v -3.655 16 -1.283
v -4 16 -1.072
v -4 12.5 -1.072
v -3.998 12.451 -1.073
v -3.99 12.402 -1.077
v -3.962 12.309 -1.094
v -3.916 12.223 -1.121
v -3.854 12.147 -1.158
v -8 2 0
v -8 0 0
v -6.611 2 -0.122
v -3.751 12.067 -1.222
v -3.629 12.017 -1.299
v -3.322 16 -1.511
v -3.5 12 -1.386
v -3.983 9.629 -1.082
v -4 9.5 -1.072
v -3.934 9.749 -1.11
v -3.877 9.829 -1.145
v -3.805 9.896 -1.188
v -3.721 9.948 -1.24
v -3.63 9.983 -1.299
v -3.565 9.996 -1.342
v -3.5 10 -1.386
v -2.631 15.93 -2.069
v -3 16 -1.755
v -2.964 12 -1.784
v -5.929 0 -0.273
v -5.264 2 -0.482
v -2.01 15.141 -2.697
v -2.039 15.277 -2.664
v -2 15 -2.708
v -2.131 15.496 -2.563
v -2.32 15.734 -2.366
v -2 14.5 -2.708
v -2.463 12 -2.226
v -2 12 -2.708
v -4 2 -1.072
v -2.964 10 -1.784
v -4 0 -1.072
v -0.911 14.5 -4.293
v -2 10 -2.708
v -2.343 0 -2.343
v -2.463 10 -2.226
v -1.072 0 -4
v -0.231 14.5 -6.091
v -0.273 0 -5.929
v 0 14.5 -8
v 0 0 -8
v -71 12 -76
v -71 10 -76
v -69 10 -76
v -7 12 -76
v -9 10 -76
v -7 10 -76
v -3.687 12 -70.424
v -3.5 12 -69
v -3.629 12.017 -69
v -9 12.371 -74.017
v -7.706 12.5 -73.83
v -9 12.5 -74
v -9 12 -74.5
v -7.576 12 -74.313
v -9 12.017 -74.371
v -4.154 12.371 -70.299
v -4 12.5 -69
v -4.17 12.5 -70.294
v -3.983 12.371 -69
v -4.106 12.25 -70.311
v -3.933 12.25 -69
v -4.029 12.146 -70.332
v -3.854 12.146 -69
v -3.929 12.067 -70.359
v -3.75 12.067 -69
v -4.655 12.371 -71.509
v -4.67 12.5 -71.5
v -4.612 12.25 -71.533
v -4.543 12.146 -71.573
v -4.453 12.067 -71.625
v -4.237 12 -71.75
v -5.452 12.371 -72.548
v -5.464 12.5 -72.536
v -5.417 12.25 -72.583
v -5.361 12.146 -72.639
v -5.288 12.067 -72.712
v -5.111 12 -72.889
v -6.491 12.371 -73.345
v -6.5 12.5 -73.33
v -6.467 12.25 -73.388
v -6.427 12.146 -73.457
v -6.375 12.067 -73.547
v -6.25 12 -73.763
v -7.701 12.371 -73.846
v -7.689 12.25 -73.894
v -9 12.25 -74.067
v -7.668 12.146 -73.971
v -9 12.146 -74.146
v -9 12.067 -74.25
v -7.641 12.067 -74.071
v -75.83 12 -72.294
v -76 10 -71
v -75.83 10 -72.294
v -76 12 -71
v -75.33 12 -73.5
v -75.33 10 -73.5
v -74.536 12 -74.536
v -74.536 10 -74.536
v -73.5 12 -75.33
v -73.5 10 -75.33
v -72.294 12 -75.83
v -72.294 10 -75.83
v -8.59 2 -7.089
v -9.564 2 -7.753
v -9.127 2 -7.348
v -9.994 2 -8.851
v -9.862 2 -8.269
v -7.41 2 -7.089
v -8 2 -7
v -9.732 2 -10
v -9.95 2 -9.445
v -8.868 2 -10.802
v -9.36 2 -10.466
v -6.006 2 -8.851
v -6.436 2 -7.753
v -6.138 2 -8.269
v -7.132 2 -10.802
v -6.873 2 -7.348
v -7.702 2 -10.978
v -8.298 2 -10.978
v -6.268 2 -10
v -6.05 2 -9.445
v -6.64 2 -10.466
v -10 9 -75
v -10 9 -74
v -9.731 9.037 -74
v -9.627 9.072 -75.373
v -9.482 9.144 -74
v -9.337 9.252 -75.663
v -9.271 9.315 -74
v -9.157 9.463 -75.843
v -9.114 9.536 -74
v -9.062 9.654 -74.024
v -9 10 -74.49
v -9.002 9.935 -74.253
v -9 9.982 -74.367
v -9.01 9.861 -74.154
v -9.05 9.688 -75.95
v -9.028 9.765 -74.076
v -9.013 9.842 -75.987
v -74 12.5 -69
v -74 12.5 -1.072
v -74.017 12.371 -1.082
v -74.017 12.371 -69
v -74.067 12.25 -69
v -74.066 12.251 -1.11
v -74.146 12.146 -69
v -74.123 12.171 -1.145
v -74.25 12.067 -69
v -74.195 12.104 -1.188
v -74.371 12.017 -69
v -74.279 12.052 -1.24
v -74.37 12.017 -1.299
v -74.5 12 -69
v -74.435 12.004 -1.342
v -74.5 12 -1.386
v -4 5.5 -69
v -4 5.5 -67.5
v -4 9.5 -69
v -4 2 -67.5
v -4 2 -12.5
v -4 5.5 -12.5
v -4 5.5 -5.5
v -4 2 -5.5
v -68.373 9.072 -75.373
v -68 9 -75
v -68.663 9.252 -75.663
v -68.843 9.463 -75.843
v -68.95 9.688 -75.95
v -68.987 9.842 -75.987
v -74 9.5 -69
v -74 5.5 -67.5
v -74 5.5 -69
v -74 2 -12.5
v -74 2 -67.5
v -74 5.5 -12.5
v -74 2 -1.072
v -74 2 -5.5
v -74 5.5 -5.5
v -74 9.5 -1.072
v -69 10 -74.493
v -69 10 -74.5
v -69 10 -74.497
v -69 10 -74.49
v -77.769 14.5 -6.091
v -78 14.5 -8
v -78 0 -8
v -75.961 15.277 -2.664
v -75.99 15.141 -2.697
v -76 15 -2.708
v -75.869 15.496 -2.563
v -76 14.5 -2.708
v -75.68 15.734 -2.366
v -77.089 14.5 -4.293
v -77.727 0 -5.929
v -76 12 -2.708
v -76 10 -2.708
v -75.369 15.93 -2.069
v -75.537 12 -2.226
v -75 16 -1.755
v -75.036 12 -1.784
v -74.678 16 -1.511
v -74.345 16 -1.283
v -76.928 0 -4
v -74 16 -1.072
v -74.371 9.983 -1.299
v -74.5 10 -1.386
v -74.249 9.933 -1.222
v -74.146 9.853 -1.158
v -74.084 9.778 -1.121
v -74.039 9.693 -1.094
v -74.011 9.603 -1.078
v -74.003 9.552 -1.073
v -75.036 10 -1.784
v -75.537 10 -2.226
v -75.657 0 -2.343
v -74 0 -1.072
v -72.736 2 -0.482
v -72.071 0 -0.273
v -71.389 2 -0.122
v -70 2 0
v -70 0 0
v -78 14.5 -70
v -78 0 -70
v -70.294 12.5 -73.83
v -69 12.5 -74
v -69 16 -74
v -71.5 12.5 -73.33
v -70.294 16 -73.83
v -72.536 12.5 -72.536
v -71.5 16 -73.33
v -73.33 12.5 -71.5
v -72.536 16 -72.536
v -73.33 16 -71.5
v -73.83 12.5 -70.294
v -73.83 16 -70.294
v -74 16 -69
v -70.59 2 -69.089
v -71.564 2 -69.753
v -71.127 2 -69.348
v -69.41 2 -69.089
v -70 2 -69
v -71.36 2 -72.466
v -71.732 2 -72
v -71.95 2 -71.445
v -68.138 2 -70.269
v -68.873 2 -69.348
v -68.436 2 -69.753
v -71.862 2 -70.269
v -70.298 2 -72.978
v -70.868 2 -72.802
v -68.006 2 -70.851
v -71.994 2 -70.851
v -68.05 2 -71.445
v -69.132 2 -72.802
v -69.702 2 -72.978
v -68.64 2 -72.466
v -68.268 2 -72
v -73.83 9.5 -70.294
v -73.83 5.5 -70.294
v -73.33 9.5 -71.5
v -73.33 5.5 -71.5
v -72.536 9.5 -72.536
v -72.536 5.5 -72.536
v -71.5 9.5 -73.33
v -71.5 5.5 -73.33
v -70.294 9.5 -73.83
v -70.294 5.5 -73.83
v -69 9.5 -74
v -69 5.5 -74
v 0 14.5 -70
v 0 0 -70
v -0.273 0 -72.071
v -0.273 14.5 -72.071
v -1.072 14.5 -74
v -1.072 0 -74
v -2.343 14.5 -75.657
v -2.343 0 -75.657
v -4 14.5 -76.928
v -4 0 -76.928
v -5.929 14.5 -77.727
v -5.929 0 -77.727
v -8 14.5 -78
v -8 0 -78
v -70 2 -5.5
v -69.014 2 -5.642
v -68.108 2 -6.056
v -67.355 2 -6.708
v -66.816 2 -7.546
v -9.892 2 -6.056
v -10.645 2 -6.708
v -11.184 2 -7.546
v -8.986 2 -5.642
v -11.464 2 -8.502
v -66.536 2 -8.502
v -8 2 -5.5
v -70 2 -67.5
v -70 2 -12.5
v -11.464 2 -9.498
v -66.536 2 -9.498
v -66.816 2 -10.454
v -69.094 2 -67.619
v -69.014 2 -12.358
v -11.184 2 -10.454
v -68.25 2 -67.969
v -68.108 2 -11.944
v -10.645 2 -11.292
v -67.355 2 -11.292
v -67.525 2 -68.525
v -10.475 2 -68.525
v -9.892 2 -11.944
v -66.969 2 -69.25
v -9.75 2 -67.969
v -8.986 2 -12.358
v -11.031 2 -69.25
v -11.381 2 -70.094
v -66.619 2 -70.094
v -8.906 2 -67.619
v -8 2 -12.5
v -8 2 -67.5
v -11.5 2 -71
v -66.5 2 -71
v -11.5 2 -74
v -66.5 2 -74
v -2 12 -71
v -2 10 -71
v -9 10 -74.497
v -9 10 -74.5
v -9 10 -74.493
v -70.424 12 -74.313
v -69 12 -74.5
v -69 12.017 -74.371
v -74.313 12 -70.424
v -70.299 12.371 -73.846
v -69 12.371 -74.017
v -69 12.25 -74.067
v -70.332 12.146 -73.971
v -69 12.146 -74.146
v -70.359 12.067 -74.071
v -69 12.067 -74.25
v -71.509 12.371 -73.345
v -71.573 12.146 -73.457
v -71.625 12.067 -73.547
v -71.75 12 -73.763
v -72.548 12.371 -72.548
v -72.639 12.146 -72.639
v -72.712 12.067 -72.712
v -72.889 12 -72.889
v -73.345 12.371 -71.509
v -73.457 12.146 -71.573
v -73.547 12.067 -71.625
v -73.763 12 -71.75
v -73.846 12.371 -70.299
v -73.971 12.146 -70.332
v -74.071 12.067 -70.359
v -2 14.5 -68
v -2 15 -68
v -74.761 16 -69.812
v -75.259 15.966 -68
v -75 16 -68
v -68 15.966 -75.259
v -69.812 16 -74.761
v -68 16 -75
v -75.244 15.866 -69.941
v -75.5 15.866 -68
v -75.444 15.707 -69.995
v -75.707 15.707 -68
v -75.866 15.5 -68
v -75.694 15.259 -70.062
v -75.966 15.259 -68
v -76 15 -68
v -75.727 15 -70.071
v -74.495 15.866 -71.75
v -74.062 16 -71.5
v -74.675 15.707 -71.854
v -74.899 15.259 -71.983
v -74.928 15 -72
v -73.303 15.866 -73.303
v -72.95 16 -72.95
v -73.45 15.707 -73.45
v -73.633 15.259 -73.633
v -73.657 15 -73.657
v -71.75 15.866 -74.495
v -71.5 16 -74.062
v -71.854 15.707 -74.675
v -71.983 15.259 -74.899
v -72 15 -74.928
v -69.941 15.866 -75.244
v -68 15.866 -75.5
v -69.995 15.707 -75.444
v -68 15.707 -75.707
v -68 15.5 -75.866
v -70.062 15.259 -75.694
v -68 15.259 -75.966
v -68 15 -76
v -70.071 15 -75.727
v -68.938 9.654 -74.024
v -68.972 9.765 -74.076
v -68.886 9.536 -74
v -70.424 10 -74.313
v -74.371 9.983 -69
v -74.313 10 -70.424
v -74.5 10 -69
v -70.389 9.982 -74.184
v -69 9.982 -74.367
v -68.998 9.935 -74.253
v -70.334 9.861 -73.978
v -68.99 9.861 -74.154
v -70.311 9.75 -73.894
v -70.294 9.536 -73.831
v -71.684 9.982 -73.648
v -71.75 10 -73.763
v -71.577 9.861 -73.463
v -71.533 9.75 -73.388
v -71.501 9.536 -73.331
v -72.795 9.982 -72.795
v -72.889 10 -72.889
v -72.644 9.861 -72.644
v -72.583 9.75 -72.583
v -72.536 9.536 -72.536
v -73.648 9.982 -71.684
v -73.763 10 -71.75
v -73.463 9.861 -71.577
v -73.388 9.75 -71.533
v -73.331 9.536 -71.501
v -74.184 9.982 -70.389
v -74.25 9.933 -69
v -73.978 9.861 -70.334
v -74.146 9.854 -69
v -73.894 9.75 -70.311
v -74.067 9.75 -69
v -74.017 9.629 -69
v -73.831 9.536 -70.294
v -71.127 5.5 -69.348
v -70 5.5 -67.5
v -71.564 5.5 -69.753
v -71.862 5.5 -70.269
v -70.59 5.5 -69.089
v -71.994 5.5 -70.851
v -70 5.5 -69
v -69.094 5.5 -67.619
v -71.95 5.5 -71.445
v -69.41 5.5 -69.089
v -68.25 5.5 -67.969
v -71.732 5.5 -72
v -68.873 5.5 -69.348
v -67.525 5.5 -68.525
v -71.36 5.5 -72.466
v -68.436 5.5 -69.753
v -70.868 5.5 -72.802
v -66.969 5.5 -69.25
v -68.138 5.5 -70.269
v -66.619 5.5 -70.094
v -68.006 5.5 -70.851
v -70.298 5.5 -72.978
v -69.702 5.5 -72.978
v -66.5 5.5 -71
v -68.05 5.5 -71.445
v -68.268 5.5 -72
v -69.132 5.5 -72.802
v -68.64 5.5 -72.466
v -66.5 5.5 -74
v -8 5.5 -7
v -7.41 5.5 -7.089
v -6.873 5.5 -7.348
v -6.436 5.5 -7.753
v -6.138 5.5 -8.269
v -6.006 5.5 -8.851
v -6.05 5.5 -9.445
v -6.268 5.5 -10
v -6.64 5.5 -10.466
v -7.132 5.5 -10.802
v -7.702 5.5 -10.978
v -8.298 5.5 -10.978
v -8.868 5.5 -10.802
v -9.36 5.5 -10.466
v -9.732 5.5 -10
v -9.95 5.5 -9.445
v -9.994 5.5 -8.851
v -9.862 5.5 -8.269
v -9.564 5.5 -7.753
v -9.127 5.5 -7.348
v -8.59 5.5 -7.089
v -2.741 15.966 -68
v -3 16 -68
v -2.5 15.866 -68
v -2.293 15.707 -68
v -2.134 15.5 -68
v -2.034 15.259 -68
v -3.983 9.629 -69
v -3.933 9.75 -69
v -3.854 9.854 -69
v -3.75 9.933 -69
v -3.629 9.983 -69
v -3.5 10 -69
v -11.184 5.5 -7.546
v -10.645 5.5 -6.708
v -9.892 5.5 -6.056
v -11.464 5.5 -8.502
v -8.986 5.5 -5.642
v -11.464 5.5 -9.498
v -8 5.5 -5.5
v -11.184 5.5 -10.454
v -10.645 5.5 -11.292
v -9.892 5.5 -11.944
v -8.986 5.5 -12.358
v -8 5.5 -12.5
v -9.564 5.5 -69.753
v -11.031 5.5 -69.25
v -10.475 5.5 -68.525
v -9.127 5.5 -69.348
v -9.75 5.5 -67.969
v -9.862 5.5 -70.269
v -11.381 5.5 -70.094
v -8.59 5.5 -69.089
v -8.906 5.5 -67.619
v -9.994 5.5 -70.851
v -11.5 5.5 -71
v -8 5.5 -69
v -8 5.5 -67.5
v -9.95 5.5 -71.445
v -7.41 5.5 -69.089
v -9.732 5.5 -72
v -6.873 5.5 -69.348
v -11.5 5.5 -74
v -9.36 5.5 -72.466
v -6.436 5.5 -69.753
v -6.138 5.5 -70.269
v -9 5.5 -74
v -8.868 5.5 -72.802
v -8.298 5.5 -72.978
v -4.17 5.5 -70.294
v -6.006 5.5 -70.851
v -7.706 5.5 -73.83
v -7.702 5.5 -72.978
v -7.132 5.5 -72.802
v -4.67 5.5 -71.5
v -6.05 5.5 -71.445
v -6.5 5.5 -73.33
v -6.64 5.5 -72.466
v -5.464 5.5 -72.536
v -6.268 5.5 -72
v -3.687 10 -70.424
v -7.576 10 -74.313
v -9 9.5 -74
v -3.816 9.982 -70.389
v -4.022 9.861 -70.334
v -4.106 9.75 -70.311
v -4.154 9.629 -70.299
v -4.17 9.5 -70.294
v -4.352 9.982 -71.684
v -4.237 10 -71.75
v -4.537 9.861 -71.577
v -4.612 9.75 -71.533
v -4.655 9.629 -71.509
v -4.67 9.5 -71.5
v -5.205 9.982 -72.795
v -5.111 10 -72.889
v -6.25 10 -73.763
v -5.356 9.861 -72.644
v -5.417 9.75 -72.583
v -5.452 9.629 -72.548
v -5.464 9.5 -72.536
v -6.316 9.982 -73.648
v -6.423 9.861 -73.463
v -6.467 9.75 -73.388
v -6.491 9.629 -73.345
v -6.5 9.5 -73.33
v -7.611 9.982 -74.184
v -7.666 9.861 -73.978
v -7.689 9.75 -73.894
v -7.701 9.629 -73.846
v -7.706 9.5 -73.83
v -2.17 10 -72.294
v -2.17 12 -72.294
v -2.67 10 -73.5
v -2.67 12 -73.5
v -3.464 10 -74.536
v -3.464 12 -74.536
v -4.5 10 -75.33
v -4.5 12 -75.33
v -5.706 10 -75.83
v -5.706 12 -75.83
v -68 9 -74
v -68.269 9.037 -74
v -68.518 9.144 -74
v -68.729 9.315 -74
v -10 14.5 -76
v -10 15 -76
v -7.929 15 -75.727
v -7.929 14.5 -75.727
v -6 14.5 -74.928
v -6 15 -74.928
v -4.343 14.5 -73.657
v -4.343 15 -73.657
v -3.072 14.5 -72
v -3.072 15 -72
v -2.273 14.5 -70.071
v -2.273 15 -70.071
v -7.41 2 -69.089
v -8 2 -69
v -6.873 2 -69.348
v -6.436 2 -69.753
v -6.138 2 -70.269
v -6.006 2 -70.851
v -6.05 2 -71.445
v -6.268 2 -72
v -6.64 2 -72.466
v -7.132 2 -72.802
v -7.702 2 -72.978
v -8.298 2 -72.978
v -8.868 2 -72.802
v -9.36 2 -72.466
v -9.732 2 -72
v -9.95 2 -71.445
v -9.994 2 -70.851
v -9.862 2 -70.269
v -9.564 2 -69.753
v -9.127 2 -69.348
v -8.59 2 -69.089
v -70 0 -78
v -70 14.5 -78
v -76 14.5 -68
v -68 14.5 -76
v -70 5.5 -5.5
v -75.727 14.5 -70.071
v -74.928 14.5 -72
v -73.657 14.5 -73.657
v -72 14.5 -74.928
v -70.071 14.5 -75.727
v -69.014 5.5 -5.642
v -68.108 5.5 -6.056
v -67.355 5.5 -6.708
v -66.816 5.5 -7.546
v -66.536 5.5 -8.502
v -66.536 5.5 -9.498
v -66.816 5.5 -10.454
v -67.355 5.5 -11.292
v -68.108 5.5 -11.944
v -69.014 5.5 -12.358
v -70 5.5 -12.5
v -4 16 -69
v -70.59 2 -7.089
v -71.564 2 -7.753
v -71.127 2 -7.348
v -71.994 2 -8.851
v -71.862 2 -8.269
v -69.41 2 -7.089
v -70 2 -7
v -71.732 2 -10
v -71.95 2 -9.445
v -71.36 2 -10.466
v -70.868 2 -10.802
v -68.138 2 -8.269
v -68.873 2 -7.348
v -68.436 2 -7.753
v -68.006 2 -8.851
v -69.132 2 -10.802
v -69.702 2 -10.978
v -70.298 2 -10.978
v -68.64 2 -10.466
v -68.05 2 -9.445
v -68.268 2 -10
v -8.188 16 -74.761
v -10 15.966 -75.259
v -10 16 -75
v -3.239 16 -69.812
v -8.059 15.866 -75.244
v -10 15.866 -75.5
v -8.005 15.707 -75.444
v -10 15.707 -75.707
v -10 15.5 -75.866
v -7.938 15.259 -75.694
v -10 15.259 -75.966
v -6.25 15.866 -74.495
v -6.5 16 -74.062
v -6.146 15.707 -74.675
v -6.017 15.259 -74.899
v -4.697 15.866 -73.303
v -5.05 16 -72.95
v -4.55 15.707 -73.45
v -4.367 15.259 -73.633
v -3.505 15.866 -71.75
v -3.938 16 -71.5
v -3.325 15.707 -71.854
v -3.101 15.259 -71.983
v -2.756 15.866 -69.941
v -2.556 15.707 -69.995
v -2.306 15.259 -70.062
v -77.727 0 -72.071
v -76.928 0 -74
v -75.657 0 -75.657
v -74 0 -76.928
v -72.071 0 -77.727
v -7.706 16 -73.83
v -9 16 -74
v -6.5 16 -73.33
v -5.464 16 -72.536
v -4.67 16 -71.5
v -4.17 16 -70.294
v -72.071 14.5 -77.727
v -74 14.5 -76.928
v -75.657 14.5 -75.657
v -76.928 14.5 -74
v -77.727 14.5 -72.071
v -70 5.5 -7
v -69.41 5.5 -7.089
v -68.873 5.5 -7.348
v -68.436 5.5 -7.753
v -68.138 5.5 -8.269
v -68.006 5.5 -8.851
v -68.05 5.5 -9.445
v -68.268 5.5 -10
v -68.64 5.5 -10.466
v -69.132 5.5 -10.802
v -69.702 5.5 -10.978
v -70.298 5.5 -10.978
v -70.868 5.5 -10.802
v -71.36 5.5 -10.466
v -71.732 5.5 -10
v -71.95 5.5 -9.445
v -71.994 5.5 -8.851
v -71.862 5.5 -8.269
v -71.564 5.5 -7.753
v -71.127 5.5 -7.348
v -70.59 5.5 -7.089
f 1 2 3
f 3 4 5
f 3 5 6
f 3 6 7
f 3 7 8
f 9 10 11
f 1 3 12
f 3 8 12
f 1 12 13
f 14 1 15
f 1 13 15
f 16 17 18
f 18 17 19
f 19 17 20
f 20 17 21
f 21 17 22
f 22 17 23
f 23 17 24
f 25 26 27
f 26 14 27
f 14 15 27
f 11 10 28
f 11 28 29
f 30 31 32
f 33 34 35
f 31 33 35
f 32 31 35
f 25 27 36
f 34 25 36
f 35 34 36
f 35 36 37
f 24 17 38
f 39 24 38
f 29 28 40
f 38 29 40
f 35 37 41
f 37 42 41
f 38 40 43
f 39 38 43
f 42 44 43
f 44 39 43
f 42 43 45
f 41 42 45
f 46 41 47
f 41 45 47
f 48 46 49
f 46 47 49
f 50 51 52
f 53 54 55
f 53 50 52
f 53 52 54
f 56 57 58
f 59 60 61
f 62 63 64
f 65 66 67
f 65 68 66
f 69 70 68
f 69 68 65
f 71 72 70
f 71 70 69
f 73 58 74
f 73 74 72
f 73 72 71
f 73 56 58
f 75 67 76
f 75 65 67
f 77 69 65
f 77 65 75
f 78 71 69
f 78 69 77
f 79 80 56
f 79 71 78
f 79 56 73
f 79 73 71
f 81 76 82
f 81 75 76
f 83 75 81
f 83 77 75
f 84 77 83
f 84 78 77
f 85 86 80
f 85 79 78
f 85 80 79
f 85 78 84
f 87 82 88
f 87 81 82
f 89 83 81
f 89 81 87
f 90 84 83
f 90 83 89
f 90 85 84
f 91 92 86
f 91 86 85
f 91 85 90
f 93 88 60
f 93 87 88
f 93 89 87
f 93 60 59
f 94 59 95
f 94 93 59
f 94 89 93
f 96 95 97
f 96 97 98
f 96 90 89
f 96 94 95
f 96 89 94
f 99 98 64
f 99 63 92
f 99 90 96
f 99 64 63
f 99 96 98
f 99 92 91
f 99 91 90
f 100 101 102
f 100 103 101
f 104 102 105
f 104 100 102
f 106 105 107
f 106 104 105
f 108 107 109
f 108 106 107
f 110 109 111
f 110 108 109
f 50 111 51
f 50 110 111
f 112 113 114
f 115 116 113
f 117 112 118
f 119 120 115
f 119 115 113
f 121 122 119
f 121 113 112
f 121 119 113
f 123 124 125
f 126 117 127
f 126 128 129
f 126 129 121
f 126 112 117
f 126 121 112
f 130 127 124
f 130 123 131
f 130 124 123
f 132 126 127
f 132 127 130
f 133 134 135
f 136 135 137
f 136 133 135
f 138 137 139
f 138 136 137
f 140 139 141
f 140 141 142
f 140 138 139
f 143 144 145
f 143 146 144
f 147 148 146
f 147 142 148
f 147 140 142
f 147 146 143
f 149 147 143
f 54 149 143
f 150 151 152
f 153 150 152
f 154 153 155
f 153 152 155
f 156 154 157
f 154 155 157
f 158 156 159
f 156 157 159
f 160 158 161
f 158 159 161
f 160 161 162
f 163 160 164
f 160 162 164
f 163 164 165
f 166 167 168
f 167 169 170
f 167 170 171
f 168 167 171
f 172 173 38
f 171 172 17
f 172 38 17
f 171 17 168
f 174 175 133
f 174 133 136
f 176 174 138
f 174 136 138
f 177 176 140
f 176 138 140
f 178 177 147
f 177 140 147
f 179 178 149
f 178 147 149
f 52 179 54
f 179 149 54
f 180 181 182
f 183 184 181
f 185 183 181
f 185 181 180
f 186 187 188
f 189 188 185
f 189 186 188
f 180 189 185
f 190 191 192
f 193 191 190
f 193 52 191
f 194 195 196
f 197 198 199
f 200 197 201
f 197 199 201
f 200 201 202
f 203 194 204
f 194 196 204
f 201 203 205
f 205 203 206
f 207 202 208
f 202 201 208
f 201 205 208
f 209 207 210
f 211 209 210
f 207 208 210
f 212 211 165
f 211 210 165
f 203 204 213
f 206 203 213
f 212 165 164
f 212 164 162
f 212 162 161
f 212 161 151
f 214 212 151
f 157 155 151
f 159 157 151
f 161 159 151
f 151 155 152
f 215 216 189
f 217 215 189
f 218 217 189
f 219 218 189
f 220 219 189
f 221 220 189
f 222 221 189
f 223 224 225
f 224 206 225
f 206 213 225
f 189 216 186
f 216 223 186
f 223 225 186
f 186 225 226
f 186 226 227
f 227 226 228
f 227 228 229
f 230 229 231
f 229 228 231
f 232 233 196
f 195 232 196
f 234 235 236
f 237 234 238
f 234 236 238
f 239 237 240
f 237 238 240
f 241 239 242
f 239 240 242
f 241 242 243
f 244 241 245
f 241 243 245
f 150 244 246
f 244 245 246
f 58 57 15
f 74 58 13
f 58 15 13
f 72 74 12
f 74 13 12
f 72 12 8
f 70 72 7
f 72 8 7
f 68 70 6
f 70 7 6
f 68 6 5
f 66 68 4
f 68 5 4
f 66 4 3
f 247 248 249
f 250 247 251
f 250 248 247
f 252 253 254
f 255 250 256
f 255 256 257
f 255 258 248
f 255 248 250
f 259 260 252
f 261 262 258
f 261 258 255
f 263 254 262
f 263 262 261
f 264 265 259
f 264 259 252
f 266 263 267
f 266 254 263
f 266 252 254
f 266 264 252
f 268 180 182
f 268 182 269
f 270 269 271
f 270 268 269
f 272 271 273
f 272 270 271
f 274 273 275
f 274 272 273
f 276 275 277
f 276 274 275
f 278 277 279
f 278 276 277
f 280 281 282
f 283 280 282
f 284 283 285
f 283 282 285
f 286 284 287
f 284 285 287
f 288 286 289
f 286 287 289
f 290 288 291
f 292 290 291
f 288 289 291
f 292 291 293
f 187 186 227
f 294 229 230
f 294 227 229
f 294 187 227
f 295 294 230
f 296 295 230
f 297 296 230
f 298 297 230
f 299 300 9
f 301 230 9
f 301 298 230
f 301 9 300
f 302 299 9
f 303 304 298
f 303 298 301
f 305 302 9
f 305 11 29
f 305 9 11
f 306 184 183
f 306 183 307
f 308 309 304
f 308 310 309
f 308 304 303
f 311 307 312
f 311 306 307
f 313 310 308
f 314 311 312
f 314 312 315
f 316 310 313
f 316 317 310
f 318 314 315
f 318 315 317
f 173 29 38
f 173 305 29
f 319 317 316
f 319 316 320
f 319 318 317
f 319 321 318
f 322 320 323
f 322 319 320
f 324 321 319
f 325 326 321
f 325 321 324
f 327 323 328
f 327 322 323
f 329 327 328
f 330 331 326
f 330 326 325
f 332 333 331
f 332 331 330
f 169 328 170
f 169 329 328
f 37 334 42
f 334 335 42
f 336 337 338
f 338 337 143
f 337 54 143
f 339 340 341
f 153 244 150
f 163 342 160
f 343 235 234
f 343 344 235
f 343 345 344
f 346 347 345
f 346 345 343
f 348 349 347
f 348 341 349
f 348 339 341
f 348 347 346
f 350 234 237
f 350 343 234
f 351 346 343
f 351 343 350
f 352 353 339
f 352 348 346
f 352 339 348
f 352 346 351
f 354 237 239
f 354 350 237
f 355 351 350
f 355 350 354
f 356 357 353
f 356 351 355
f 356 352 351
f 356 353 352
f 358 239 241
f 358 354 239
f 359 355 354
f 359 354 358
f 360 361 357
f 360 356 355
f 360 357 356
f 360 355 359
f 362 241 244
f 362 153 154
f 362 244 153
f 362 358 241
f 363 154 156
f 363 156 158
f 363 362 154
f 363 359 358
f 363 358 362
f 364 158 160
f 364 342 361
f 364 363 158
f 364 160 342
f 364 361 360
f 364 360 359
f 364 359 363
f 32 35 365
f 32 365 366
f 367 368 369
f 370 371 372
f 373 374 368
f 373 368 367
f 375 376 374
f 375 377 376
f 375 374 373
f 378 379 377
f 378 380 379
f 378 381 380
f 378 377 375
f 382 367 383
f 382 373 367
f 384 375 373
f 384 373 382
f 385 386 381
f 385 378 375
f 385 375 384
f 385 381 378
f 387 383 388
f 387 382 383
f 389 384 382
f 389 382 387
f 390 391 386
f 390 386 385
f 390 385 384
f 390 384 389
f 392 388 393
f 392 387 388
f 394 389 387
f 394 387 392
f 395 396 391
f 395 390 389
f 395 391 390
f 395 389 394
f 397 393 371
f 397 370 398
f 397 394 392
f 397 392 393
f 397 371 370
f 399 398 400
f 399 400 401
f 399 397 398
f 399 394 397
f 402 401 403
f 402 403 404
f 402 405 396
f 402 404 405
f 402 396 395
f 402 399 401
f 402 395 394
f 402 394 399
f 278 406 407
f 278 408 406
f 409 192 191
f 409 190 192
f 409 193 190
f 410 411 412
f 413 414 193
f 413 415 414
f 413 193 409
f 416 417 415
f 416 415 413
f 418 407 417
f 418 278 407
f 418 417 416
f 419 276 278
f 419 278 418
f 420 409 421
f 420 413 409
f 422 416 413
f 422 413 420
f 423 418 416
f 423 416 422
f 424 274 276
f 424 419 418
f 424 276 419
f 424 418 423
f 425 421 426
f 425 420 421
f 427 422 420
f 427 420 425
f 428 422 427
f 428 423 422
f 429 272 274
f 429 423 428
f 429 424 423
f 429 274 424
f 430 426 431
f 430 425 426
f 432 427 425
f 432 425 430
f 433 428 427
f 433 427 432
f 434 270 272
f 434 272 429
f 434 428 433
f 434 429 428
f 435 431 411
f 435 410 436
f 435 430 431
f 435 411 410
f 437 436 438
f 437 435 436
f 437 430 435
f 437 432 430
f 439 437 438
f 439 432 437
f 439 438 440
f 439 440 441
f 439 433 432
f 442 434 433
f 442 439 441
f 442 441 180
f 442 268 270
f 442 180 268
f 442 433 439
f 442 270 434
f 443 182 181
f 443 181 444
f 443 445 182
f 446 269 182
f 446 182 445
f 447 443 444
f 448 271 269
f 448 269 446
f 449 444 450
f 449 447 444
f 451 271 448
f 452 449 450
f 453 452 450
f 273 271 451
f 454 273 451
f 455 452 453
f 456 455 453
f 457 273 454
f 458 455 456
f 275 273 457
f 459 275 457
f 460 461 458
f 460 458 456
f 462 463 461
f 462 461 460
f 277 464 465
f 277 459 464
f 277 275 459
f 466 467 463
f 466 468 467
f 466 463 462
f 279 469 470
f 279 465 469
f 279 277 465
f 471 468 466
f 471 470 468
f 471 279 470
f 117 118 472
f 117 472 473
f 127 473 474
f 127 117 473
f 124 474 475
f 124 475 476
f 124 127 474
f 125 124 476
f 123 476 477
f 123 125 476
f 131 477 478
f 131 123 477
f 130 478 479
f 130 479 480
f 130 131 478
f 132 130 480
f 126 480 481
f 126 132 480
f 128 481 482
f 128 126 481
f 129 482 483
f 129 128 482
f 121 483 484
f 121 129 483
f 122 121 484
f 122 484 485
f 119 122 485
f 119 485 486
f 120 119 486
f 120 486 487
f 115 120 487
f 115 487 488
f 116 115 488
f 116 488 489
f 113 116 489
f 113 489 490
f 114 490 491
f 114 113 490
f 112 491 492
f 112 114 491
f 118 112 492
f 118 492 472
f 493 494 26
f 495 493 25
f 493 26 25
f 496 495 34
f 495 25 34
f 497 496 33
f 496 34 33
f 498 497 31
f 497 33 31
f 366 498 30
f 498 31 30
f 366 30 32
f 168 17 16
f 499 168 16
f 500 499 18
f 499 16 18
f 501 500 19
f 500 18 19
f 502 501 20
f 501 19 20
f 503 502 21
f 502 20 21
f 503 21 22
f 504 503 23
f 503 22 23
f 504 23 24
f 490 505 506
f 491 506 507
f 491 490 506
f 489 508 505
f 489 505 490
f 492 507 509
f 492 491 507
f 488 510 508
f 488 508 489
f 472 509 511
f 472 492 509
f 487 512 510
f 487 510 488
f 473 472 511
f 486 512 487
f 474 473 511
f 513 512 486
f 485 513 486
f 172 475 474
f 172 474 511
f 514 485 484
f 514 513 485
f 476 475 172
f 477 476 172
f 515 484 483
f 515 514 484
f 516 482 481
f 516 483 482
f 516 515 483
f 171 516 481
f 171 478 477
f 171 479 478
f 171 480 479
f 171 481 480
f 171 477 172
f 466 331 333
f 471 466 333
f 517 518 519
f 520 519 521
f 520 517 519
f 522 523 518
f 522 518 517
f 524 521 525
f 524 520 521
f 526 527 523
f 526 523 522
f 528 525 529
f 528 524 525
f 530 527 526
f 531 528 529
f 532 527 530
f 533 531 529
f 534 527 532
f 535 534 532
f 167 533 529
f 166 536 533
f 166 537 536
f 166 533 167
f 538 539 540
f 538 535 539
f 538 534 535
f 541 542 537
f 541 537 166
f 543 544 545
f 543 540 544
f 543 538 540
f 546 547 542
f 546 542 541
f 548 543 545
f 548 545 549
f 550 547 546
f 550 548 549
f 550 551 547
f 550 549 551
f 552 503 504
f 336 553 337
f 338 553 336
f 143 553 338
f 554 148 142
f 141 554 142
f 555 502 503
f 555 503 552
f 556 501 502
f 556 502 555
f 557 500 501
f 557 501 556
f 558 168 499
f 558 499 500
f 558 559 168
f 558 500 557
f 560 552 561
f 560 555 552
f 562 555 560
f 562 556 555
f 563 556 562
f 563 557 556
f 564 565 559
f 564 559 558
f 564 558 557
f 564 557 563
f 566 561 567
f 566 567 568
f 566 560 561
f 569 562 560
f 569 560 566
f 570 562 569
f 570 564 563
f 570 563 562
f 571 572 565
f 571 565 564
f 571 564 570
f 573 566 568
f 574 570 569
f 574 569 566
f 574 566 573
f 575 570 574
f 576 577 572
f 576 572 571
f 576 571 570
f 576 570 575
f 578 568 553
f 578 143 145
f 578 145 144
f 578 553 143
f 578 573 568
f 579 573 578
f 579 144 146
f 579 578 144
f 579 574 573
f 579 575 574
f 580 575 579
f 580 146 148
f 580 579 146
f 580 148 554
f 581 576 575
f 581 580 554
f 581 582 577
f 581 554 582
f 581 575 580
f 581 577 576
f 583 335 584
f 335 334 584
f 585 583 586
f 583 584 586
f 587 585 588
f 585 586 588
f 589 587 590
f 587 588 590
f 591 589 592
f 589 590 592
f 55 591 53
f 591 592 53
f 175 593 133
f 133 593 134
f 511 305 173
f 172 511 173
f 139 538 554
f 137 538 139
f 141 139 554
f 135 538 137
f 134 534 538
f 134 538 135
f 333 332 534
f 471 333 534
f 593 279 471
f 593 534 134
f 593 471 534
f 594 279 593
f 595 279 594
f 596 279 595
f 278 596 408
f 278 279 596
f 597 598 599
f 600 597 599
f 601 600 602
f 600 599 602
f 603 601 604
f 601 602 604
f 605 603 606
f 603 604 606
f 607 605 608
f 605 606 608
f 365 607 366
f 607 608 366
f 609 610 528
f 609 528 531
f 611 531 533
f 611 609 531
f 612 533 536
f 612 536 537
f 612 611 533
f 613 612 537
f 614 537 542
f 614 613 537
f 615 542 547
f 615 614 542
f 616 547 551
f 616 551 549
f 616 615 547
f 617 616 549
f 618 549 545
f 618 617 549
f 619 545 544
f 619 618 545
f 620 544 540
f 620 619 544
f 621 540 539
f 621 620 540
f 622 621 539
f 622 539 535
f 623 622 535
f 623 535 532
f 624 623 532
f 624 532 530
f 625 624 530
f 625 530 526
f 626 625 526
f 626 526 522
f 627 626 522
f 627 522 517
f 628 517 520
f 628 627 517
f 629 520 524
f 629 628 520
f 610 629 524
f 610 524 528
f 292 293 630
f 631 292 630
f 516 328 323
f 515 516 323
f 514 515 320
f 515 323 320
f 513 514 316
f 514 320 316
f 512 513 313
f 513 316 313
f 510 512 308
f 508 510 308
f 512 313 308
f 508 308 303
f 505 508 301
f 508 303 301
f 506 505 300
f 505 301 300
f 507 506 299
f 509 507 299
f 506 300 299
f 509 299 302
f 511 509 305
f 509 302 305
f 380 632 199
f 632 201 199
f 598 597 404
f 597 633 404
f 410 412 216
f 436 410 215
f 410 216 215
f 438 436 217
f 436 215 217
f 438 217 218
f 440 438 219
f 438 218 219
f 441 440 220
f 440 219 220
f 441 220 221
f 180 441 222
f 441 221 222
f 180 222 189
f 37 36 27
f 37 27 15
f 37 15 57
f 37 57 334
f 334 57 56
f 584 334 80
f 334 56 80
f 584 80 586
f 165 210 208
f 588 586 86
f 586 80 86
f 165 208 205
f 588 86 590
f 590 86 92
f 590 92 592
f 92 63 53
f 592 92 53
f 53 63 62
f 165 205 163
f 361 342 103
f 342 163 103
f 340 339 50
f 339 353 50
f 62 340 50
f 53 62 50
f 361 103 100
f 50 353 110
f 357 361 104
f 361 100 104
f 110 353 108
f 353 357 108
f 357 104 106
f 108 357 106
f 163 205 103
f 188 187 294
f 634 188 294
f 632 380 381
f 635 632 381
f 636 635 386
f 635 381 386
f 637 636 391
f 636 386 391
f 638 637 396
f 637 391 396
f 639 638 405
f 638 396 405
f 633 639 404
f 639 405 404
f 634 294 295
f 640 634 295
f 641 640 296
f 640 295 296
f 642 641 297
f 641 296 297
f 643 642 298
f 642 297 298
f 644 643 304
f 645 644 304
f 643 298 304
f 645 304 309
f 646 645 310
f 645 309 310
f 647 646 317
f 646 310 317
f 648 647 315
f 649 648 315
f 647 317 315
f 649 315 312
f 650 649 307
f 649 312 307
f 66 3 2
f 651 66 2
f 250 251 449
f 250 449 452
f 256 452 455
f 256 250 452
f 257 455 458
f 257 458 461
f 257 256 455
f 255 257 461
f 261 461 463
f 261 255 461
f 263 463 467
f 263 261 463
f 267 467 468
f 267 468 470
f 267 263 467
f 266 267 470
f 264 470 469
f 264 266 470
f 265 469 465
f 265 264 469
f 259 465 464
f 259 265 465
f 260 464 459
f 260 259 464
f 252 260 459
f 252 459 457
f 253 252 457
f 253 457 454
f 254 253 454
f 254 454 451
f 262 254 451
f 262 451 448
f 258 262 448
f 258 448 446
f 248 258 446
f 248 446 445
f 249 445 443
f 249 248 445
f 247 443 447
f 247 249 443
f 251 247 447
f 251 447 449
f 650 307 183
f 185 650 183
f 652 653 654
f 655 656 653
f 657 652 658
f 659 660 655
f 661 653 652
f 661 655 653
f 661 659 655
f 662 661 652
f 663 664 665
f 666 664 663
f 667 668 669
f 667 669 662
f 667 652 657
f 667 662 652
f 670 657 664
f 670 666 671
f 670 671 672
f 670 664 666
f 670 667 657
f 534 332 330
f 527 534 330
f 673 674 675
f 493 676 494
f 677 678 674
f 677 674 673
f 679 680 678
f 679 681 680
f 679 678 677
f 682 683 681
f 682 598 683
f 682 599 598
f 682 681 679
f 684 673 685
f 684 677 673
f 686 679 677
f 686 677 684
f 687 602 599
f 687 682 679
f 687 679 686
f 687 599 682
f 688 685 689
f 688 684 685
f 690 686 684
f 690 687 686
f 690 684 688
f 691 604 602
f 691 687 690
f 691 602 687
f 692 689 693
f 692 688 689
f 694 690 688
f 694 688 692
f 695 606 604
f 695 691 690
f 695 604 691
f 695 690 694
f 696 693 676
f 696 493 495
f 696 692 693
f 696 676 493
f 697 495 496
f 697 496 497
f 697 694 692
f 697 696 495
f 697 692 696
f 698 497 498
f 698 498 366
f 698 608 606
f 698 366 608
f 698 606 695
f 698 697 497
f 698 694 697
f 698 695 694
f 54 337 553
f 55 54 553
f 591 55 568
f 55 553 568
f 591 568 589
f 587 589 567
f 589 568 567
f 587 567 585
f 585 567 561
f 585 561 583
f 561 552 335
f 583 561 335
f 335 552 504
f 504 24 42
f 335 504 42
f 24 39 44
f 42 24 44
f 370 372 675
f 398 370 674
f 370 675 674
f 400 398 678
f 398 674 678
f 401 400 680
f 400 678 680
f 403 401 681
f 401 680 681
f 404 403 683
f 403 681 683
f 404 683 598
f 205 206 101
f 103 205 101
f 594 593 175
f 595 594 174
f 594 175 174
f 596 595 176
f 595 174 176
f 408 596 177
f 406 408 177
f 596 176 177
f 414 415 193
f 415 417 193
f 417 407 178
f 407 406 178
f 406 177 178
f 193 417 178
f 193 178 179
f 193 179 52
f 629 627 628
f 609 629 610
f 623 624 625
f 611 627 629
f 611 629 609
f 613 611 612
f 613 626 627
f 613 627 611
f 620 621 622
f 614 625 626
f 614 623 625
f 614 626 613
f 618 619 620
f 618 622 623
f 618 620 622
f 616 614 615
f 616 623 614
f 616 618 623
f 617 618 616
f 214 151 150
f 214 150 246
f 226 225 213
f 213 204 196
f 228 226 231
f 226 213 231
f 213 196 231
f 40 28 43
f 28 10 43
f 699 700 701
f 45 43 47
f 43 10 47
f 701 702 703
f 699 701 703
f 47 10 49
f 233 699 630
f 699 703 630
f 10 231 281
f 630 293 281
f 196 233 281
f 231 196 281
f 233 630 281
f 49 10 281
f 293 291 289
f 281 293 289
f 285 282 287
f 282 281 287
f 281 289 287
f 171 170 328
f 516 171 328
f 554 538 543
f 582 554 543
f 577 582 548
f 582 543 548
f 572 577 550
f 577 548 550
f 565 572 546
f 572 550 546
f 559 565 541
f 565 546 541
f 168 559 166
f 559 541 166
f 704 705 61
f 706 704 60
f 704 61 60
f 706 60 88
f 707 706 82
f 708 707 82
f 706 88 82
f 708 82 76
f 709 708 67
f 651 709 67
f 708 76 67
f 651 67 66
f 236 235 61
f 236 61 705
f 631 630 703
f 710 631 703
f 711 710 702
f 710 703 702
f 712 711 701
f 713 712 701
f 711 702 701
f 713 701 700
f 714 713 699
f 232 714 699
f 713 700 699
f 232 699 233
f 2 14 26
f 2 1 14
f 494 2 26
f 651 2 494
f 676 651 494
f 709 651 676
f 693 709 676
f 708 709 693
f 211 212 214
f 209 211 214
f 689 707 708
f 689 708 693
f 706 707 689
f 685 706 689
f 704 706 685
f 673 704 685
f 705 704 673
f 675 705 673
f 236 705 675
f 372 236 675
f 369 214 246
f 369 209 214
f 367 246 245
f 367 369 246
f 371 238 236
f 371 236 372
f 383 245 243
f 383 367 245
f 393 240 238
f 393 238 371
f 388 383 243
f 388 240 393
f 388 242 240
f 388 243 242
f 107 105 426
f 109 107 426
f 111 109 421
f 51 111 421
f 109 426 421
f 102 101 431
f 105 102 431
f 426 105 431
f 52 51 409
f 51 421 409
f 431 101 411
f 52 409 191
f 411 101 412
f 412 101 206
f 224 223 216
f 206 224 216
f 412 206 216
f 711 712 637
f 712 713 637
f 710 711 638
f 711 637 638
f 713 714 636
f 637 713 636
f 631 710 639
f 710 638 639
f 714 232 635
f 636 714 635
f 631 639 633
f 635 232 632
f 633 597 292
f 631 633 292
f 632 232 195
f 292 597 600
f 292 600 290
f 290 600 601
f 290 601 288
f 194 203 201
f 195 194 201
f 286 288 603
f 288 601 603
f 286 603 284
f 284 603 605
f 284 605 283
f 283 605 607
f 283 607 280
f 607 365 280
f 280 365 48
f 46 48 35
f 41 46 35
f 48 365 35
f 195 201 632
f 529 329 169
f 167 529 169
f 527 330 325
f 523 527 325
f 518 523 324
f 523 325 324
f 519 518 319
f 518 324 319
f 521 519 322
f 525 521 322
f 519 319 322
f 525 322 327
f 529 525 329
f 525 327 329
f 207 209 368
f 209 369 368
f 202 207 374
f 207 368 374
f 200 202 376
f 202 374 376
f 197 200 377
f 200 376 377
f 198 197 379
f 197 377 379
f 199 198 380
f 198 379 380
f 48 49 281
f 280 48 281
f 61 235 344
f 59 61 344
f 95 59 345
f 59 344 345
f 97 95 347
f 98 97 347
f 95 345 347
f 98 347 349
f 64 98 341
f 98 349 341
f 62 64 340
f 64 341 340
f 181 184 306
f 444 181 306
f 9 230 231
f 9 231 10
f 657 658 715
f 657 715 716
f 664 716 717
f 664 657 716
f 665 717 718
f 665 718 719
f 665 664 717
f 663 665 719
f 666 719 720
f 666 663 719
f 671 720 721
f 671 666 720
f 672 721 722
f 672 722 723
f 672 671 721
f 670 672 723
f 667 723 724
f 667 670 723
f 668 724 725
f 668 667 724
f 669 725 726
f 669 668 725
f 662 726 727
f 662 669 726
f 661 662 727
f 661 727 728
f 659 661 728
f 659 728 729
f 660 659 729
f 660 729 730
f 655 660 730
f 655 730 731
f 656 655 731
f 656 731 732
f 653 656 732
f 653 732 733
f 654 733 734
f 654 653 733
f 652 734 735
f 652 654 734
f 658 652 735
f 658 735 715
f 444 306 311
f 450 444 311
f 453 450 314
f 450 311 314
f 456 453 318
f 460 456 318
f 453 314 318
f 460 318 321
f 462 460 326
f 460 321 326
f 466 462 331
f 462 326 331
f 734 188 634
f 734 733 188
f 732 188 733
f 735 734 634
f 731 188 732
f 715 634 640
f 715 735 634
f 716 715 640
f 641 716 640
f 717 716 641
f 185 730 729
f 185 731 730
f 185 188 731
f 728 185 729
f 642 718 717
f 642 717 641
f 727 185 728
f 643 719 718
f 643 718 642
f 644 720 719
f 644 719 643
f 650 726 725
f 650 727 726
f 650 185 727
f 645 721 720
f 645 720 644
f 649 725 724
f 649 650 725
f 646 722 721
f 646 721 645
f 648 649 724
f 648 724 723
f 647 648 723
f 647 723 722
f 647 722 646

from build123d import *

# Parameters (mm, degrees)
BOSS_EXTRUDE1_DEPTH = 16
SKETCH2_4_W         = 74
SKETCH2_4_H         = 76
BOSS_EXTRUDE2_DEPTH = 2
SKETCH3_W           = 2
SKETCH3_H           = 4
SKETCH3_H_2         = 8
BOSS_EXTRUDE3_DEPTH = 76
LPATTERN1_COUNT     = 2
LPATTERN1_PITCH     = 72
SKETCH4_W           = 2
SKETCH4_H           = 4
SKETCH4_H_2         = 8
BOSS_EXTRUDE5_DEPTH = 71
FILLET2_R           = 5
SKETCH7_R           = 2
BOSS_EXTRUDE9_DEPTH = 3.5
SKETCH8_W           = 60
SKETCH8_H           = 1
CUT_EXTRUDE1_DEPTH  = 2
FILLET12_R          = 1
SKETCH11_W          = 2
SKETCH11_H          = 1.5
CUT_EXTRUDE2_DEPTH  = 112.462998345
SKETCH12_W          = 2
SKETCH12_H          = 1.5
CUT_EXTRUDE3_DEPTH  = 111.072703247
FILLET13_R          = 8
FILLET14_R          = 1
FILLET16_R          = 0.5


# Some blends are built 0.0001 mm under size
with BuildPart() as part:
    # Sketch2 → Boss-Extrude1 (new body)
    with BuildSketch(Plane(origin=(0, 0, 0), x_dir=(1, 0, 0), z_dir=(0, 1, 0))):
        Polygon((-78, 0), (-76, 0), (-76, 76), (-2, 76), (-2, 0), (0, 0), (0, 78), (-78, 78), align=None)
    extrude(amount=BOSS_EXTRUDE1_DEPTH)

    # Sketch2<4> → Boss-Extrude2 (add)
    with BuildSketch(Plane(origin=(0, 0, 0), x_dir=(1, 0, 0), z_dir=(0, 1, 0))):
        with Locations((-39, 38)):
            Rectangle(SKETCH2_4_W, SKETCH2_4_H)
    extrude(amount=BOSS_EXTRUDE2_DEPTH)

    # Sketch3 → Boss-Extrude3 (add)
    with BuildSketch(Plane.XY):
        with Locations((-75, 14)):
            Rectangle(SKETCH3_W, SKETCH3_H)
        with Locations((-75, 6)):
            Rectangle(SKETCH3_W, SKETCH3_H_2)
    boss_extrude3 = extrude(amount=-BOSS_EXTRUDE3_DEPTH)

    # LPattern1: Boss-Extrude3 ×2
    with Locations(*[(i * LPATTERN1_PITCH, 0, 0) for i in range(1, LPATTERN1_COUNT)]):
        add(boss_extrude3)

    # Sketch4 → Boss-Extrude5 (add)
    with BuildSketch(Plane(origin=(-74, 0, 0), x_dir=(0, 0, -1), z_dir=(1, 0, 0))):
        with Locations((75, 14)):
            Rectangle(SKETCH4_W, SKETCH4_H)
        with Locations((75, 6)):
            Rectangle(SKETCH4_W, SKETCH4_H_2)
    extrude(amount=BOSS_EXTRUDE5_DEPTH)

    # Fillet2
    fillet2_edges = [part.edges().sort_by_distance(p)[0] for p in [
        (-74, 14, -74),
        (-4, 6, -74),
        (-74, 6, -74),
        (-76, 11, -76),
        (-2, 11, -76),
        (-4, 14, -74),
    ]]
    fillet(fillet2_edges, radius=FILLET2_R)

    # Sketch7 → Boss-Extrude9 (add)
    # profile 1 of 4: a face of its own
    with BuildSketch(Plane(origin=(0, 2, 0), x_dir=(1, 0, 0), z_dir=(0, 1, 0))):
        with BuildLine():
            Line((-66.5, 74.491060011), (-74, 74.491060011))
            Line((-74, 74.491060011), (-74, 67.5))
            Line((-74, 67.5), (-70, 67.5))
            ThreePointArc((-70, 67.5), (-67.525126266, 68.525126266), (-66.5, 71))
            Line((-66.5, 71), (-66.5, 74.491060011))
        make_face()
        with Locations(Location((-70, 71, 0), (0, 0, 270))):
            Circle(SKETCH7_R, mode=Mode.SUBTRACT)
    # profile 2 of 4: a face of its own
    with BuildSketch(Plane(origin=(0, 2, 0), x_dir=(1, 0, 0), z_dir=(0, 1, 0))):
        with BuildLine():
            ThreePointArc((-11.5, 71), (-10.474873734, 68.525126266), (-8, 67.5))
            Line((-8, 67.5), (-4, 67.5))
            Line((-4, 67.5), (-4, 74.5))
            Line((-4, 74.5), (-11.5, 74.5))
            Line((-11.5, 74.5), (-11.5, 71))
        make_face()
        with Locations(Location((-8, 71, 0), (0, 0, 270))):
            Circle(SKETCH7_R, mode=Mode.SUBTRACT)
    # profile 3 of 4: a face of its own
    with BuildSketch(Plane(origin=(0, 2, 0), x_dir=(1, 0, 0), z_dir=(0, 1, 0))):
        with BuildLine():
            Line((-74, 5.5), (-70, 5.5))
            ThreePointArc((-70, 5.5), (-66.5, 9), (-70, 12.5))
            Line((-70, 12.5), (-74, 12.5))
            Line((-74, 12.5), (-74, 5.5))
        make_face()
        with Locations(Location((-70, 9, 0), (0, 0, 270))):
            Circle(SKETCH7_R, mode=Mode.SUBTRACT)
    # profile 4 of 4: a face of its own
    with BuildSketch(Plane(origin=(0, 2, 0), x_dir=(1, 0, 0), z_dir=(0, 1, 0))):
        with BuildLine():
            Line((-4, 12.5), (-8, 12.5))
            ThreePointArc((-8, 12.5), (-11.5, 9), (-8, 5.5))
            Line((-8, 5.5), (-4, 5.5))
            Line((-4, 5.5), (-4, 12.5))
        make_face()
        with Locations(Location((-8, 9, 0), (0, 0, 270))):
            Circle(SKETCH7_R, mode=Mode.SUBTRACT)
    extrude(amount=BOSS_EXTRUDE9_DEPTH)

    # Sketch8 → Cut-Extrude1 (cut)
    with BuildSketch(Plane.XY.offset(-74)):
        with Locations((-39, 9.5)):
            Rectangle(SKETCH8_W, SKETCH8_H)
    extrude(amount=-CUT_EXTRUDE1_DEPTH, mode=Mode.SUBTRACT)

    # Fillet12
    fillet12_edges = [part.edges().sort_by_distance(p)[0] for p in [
        (-9, 9, -75),
        (-69, 9, -75),
        (-39, 9, -76),
    ]]
    fillet(fillet12_edges, radius=FILLET12_R - 0.0001)  # a hair under: the kernel refuses the full size

    # Sketch11 → Cut-Extrude2 (cut, through all)
    with BuildSketch(Plane.XY):
        with Locations((-77, 15.25)):
            Rectangle(SKETCH11_W, SKETCH11_H)
        with Locations((-1, 15.25)):
            Rectangle(SKETCH11_W, SKETCH11_H)
    extrude(amount=-CUT_EXTRUDE2_DEPTH, mode=Mode.SUBTRACT)

    # Sketch12 → Cut-Extrude3 (cut, through all)
    with BuildSketch(Plane.ZY.offset(76)):
        with Locations((-77, 15.25)):
            Rectangle(SKETCH12_W, SKETCH12_H)
    extrude(amount=-CUT_EXTRUDE3_DEPTH, mode=Mode.SUBTRACT)

    # Fillet13
    # the kernel refuses this fillet: 8 mm, written as the material it takes off along each edge
    with BuildSketch(Plane(origin=(-78, -20, -78), x_dir=(0, 0, 1), z_dir=(0, 1, 0)), Plane(origin=(0, -20, -78), x_dir=(-1, 0, 0), z_dir=(0, 1, 0)), Plane(origin=(-78, -20, 0), x_dir=(1, 0, 0), z_dir=(0, 1, 0))) as fillet13_piece_1:
        with BuildLine():
            CenterArc((FILLET13_R, FILLET13_R), FILLET13_R, 180, 90)
            Line((0, FILLET13_R), (0, 0))
            Line((0, 0), (FILLET13_R, 0))
        make_face()
    extrude(amount=54.5, mode=Mode.SUBTRACT)
    with BuildSketch(Plane(origin=(-76, 36, -76), x_dir=(0, 0, 1), z_dir=(0, -1, 0)), Plane(origin=(-2, 36, -76), x_dir=(-1, 0, 0), z_dir=(0, -1, 0))) as fillet13_piece_2:
        with BuildLine():
            CenterArc((FILLET13_R, -FILLET13_R), FILLET13_R, 90, 90)
            Line((0, -FILLET13_R), (0, 0))
            Line((0, 0), (FILLET13_R, 0))
        make_face()
    extrude(amount=21.5, mode=Mode.SUBTRACT)
    with BuildSketch(Plane(origin=(0, -20, 0), x_dir=(-1, 0, 0), z_dir=(0, 1, 0))) as fillet13_piece_3:
        with BuildLine():
            CenterArc((FILLET13_R, -FILLET13_R), FILLET13_R, 90, 90)
            Line((0, -FILLET13_R), (0, 0))
            Line((0, 0), (FILLET13_R, 0))
        make_face()
    extrude(amount=54.5, mode=Mode.SUBTRACT)

    # Fillet14
    fillet14_edges = [part.edges().sort_by_distance(p)[0] for p in [
        (-39, 16, -76),
        (-76, 16, -35.354248689),
        (-2, 16, -35.354248689),
        (-4.343145751, 16, -73.656854249),
        (-73.656854249, 16, -73.656854249),
    ]]
    fillet(fillet14_edges, radius=FILLET14_R)

    # Fillet16
    # the kernel refuses this fillet: 0.5 mm, written as the material it takes off along each edge
    with BuildSketch(Plane(origin=(-74, 10, 0.17820323), x_dir=(0, -1, 0), z_dir=(0, 0, -1)), Plane(origin=(-4, 10, 0.17820323), x_dir=(1, 0, 0), z_dir=(0, 0, -1)), Plane(origin=(-4, 12, 0.17820323), x_dir=(0, 1, 0), z_dir=(0, 0, -1)), Plane(origin=(-74, 12, 0.17820323), x_dir=(-1, 0, 0), z_dir=(0, 0, -1))) as fillet16_piece_1:
        with BuildLine():
            CenterArc((FILLET16_R, FILLET16_R), FILLET16_R, 180, 90)
            Line((0, FILLET16_R), (0, 0))
            Line((0, 0), (FILLET16_R, 0))
        make_face()
    extrude(amount=69.17820323, mode=Mode.SUBTRACT)
    with BuildSketch(Plane(origin=(-69, 12, -74), x_dir=(0, 0, -1), z_dir=(1, 0, 0))) as fillet16_piece_2:
        with BuildLine():
            CenterArc((FILLET16_R, FILLET16_R), FILLET16_R, 180, 90)
            Line((0, FILLET16_R), (0, 0))
            Line((0, 0), (FILLET16_R, 0))
        make_face()
    extrude(amount=60, mode=Mode.SUBTRACT)
    with BuildSketch(Plane(origin=(-9, 12, -69), x_dir=(1, 0, 0), z_dir=(0, 0, 1))) as fillet16_piece_3:
        with BuildLine():
            CenterArc((5 + FILLET16_R, FILLET16_R), FILLET16_R, 180, 90)
            Line((5, FILLET16_R), (5, 0))
            Line((5, 0), (5 + FILLET16_R, 0))
        make_face()
    revolve(axis=Axis((-9, 12, -69), (0, 1, 0)), revolution_arc=90, mode=Mode.SUBTRACT)
    with BuildSketch(Plane(origin=(-9, 10, -69), x_dir=(1, 0, 0), z_dir=(0, 0, 1))) as fillet16_piece_4:
        with BuildLine():
            CenterArc((5 + FILLET16_R, -FILLET16_R), FILLET16_R, 90, 90)
            Line((5, -FILLET16_R), (5, 0))
            Line((5, 0), (5 + FILLET16_R, 0))
        make_face()
    revolve(axis=Axis((-9, 10, -69), (0, 1, 0)), revolution_arc=104.329698924, mode=Mode.SUBTRACT)
    with BuildSketch(Plane(origin=(-69, 12, -69), x_dir=(0, 0, -1), z_dir=(1, 0, 0))) as fillet16_piece_5:
        with BuildLine():
            CenterArc((5 + FILLET16_R, FILLET16_R), FILLET16_R, 180, 90)
            Line((5, FILLET16_R), (5, 0))
            Line((5, 0), (5 + FILLET16_R, 0))
        make_face()
    revolve(axis=Axis((-69, 12, -69), (0, 1, 0)), revolution_arc=90, mode=Mode.SUBTRACT)
    with BuildSketch(Plane(origin=(-69, 10, -69), x_dir=(0.24750126301206582, 0, -0.9688875707776585), z_dir=(0.9688875707776585, 0, 0.24750126301206582))) as fillet16_piece_6:
        with BuildLine():
            CenterArc((5 + FILLET16_R, -FILLET16_R), FILLET16_R, 90, 90)
            Line((5, -FILLET16_R), (5, 0))
            Line((5, 0), (5 + FILLET16_R, 0))
        make_face()
    revolve(axis=Axis((-69, 10, -69), (0, 1, 0)), revolution_arc=104.329698924, mode=Mode.SUBTRACT)


solid = part.part
